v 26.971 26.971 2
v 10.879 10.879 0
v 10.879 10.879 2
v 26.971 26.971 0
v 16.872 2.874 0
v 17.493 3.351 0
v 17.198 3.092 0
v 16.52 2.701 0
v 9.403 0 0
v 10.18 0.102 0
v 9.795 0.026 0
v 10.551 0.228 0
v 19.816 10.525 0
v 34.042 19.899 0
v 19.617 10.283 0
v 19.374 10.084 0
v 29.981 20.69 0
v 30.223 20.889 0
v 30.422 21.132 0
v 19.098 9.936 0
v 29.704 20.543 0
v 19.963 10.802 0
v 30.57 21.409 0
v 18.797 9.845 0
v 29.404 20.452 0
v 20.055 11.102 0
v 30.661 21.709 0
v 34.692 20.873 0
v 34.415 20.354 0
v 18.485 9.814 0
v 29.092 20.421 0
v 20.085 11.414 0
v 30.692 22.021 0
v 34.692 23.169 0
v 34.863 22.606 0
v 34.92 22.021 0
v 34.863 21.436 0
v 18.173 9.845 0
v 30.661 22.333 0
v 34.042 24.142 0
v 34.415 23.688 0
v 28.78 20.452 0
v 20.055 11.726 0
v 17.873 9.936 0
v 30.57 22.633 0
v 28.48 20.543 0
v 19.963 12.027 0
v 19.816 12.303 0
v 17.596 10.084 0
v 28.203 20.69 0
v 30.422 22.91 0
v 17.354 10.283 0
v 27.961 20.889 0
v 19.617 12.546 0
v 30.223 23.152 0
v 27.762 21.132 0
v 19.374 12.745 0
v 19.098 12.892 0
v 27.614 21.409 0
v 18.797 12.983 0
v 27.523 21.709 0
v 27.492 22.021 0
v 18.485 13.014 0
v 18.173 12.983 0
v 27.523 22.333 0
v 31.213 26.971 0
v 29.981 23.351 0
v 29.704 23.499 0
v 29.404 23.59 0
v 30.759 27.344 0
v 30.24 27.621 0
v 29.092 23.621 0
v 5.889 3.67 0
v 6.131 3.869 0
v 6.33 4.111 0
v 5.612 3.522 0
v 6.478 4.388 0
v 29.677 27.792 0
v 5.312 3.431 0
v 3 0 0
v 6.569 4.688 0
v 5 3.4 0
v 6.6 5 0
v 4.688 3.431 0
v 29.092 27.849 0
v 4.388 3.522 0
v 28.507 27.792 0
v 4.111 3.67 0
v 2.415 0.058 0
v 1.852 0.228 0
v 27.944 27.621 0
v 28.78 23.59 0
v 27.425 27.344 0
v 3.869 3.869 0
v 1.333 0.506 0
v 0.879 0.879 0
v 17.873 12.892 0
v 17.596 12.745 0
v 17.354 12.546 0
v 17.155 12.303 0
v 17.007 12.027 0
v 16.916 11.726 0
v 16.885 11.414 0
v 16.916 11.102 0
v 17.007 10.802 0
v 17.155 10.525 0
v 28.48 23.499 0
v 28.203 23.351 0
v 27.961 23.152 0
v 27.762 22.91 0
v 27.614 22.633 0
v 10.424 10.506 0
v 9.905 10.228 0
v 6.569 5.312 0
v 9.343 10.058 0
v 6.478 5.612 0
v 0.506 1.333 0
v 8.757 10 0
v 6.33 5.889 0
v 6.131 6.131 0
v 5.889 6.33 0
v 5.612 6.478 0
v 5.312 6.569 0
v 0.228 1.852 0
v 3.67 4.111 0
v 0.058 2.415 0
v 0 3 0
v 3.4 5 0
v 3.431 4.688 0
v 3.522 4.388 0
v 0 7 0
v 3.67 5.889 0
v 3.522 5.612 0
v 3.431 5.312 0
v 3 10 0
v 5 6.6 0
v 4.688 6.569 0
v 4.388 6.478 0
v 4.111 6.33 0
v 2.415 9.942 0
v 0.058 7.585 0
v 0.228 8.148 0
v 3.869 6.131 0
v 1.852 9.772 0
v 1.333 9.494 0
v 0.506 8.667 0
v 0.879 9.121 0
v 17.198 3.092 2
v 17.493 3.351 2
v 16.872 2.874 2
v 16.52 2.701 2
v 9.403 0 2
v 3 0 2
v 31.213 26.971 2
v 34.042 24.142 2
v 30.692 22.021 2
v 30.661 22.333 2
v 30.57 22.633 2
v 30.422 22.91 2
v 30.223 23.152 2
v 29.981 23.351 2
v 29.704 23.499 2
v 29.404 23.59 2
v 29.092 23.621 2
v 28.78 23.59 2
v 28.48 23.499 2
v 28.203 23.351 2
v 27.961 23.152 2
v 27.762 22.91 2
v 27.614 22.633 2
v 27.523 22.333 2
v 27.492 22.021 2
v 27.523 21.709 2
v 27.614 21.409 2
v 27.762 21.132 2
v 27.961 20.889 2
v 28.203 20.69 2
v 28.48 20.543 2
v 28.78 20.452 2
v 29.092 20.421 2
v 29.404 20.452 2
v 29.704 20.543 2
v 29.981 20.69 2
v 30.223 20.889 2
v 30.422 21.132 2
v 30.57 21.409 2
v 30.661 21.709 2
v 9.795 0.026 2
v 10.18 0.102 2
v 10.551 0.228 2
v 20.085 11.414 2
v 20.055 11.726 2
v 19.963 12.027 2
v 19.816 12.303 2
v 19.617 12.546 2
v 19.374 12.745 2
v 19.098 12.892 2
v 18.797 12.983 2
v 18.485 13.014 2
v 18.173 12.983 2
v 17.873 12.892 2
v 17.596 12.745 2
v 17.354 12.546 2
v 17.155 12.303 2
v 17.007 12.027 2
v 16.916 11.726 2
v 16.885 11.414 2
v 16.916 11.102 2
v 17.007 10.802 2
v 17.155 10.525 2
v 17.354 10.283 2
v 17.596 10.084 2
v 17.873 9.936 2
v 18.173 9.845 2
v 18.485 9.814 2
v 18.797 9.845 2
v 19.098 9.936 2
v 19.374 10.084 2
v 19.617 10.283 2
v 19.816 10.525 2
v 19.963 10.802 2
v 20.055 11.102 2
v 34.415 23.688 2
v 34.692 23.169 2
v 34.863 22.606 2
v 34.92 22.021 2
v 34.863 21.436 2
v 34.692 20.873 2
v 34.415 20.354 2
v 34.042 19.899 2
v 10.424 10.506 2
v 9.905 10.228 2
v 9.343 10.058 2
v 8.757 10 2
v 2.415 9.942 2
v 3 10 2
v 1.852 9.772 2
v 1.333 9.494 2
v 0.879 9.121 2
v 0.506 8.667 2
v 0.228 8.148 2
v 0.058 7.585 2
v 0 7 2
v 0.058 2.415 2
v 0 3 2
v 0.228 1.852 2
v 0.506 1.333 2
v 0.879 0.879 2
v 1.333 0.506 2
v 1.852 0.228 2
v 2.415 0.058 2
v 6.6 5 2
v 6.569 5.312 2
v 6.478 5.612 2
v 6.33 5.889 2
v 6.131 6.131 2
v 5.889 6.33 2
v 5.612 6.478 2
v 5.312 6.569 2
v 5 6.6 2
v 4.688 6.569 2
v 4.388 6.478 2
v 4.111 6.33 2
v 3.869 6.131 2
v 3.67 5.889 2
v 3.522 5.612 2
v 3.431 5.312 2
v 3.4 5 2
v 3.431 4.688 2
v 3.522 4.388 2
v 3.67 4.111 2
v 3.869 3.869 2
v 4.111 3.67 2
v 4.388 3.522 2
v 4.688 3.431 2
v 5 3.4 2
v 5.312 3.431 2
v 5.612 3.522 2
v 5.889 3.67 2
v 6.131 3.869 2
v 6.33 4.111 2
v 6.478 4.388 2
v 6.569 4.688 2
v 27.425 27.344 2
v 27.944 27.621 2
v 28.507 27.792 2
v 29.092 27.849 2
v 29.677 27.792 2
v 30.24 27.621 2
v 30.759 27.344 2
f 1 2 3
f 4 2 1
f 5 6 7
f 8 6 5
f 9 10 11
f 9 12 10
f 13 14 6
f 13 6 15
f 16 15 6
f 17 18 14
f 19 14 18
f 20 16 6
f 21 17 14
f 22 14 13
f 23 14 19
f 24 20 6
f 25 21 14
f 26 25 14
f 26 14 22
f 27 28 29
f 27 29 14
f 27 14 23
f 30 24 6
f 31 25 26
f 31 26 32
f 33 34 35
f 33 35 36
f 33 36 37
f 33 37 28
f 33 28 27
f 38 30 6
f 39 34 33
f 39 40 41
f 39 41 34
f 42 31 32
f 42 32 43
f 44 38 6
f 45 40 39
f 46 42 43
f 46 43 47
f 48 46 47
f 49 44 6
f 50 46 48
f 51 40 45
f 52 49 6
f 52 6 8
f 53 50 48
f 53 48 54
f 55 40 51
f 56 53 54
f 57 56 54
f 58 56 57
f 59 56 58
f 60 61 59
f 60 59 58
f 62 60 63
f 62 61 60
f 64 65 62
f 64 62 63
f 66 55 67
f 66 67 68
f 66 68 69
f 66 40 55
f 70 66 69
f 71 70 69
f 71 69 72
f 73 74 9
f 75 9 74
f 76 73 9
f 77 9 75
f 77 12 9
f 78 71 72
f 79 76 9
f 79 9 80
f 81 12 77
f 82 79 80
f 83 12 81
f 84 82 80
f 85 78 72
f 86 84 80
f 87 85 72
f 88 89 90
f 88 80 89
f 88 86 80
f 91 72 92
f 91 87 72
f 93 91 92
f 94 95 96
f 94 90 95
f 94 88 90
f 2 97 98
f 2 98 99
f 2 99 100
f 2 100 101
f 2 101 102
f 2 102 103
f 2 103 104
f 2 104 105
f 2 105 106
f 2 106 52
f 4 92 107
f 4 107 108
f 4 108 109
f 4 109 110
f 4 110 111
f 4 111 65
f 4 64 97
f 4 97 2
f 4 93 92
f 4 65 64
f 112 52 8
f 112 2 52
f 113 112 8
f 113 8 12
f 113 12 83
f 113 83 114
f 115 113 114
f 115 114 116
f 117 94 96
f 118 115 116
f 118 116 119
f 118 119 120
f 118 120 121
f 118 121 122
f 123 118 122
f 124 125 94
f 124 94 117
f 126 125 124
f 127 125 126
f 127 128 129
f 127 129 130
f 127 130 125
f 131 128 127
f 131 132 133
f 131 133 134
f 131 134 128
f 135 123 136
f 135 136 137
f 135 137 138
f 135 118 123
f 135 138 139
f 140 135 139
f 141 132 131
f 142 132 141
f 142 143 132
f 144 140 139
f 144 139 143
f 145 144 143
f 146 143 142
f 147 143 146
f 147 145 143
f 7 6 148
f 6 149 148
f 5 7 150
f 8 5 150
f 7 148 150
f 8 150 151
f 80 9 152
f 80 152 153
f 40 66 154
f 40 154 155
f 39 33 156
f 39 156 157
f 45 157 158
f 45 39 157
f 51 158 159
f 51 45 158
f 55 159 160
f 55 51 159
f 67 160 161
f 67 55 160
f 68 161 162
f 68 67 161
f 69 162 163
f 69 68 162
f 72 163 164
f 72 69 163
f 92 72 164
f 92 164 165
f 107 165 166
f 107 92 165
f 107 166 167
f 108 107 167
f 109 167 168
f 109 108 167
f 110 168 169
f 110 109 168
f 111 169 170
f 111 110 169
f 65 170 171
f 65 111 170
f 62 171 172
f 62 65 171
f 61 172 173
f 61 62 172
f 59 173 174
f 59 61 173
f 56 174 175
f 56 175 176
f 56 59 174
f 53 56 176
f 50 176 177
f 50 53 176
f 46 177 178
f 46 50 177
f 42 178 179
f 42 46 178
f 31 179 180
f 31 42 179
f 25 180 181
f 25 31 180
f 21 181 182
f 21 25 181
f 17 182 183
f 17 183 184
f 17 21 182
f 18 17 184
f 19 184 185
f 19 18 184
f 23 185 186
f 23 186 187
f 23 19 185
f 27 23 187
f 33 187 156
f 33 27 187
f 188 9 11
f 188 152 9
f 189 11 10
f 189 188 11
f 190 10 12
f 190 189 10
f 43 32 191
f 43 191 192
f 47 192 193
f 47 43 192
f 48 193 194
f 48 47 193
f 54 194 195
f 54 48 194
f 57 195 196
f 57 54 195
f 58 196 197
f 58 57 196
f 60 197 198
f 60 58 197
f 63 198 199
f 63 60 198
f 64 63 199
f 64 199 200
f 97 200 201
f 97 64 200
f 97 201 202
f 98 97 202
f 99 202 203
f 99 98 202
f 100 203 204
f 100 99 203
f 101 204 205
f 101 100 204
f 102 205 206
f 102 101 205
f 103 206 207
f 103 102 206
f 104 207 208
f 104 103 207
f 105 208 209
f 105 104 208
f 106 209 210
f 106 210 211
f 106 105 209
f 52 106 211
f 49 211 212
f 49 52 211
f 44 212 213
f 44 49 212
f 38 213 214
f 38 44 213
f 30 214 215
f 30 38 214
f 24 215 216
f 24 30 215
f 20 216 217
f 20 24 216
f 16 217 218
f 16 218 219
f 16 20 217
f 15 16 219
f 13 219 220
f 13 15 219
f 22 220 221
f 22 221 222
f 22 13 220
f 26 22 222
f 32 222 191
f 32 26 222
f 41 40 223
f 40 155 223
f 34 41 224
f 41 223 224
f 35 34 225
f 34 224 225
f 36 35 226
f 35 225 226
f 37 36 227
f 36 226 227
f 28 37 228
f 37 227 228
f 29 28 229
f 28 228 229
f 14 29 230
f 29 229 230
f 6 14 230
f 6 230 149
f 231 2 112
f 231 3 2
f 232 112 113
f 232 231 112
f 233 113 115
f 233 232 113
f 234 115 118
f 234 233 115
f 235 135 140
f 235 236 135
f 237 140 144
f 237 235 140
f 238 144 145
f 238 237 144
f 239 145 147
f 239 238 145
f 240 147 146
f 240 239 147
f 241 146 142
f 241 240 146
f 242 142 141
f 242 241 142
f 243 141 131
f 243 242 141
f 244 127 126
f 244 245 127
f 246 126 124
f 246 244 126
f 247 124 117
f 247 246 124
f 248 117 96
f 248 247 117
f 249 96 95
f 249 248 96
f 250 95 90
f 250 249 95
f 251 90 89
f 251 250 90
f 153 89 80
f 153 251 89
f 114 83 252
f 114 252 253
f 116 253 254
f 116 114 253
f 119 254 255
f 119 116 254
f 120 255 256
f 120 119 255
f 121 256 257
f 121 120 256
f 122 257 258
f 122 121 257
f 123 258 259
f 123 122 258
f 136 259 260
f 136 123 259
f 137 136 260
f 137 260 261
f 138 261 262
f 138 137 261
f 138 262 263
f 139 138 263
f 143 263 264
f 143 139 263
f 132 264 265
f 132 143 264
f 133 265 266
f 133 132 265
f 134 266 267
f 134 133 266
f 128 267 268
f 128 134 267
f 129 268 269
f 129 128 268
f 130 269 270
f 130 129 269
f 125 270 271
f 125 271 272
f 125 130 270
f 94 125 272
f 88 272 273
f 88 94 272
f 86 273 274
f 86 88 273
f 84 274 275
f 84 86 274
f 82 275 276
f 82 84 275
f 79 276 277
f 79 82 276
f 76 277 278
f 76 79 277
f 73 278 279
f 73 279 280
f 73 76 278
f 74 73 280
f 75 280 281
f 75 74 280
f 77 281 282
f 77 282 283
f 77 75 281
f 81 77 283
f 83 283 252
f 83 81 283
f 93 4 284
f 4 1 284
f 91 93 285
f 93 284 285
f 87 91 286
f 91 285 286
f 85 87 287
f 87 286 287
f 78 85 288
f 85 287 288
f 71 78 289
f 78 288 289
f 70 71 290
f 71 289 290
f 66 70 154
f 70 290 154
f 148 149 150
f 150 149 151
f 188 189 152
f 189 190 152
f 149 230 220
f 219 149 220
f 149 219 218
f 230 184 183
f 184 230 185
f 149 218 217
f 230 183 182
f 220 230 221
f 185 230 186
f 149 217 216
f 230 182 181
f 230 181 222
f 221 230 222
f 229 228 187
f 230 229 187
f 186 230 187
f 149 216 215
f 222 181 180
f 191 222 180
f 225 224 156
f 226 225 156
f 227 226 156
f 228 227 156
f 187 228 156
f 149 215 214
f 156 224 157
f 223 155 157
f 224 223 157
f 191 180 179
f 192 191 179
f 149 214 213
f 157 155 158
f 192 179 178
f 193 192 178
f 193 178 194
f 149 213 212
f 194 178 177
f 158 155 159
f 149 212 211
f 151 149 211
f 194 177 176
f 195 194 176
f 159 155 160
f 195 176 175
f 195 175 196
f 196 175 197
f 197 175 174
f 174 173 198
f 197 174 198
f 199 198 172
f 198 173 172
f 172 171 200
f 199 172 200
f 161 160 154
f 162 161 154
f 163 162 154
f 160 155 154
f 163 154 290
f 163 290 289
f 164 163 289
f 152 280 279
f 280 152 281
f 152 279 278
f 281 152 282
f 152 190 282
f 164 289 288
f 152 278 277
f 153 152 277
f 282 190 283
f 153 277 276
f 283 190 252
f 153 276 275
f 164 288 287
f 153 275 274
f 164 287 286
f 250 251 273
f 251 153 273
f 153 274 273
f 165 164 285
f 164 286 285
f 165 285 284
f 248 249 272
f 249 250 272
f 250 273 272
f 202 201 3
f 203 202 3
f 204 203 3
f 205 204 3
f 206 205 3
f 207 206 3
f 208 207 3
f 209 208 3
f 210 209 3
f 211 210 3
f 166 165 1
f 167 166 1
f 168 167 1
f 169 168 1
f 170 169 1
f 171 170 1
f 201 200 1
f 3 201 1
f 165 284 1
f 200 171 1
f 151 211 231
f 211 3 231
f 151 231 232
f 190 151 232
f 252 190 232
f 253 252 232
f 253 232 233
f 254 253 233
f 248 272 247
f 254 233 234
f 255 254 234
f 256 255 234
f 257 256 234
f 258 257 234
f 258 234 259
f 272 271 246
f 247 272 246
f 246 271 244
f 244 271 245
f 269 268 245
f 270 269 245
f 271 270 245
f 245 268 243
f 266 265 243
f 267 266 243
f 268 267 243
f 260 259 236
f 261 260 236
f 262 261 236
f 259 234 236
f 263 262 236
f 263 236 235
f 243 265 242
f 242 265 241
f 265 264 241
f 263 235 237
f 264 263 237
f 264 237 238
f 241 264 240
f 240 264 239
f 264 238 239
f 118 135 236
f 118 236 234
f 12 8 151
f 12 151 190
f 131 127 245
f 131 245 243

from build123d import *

# Parameters (mm, degrees)
SKETCH_1_R      = 1.6
EXTRUDE_2_DEPTH = 2
FILLET_1_R      = 3


with BuildPart() as part:
    # ｽｹｯﾁ1 → ﾎﾞｽ - 押し出し2 (new body)
    with BuildSketch(Plane.XY):
        Polygon((10, 10), (29.091883092, 29.091883092), (36.162950904, 22.02081528), (17.071067812, 2.928932188), (10, 0), (0, 0), (0, 10), align=None)
        with Locations((5, 5)):
            Circle(SKETCH_1_R, mode=Mode.SUBTRACT)
        with Locations((29.091883092, 22.02081528)):
            Circle(SKETCH_1_R, mode=Mode.SUBTRACT)
        with Locations((18.485281374, 11.414213562)):
            Circle(SKETCH_1_R, mode=Mode.SUBTRACT)
    extrude(amount=EXTRUDE_2_DEPTH)

    # ﾌｨﾚｯﾄ1
    fillet_1_edges = [part.edges().sort_by_distance(p)[0] for p in [
        (0, 0, 1),
        (0, 10, 1),
        (10, 10, 1),
        (29.091883092, 29.091883092, 1),
        (36.162950904, 22.02081528, 1),
        (17.071067812, 2.928932188, 1),
        (10, 0, 1),
    ]]
    fillet(fillet_1_edges, radius=FILLET_1_R)


solid = part.part
